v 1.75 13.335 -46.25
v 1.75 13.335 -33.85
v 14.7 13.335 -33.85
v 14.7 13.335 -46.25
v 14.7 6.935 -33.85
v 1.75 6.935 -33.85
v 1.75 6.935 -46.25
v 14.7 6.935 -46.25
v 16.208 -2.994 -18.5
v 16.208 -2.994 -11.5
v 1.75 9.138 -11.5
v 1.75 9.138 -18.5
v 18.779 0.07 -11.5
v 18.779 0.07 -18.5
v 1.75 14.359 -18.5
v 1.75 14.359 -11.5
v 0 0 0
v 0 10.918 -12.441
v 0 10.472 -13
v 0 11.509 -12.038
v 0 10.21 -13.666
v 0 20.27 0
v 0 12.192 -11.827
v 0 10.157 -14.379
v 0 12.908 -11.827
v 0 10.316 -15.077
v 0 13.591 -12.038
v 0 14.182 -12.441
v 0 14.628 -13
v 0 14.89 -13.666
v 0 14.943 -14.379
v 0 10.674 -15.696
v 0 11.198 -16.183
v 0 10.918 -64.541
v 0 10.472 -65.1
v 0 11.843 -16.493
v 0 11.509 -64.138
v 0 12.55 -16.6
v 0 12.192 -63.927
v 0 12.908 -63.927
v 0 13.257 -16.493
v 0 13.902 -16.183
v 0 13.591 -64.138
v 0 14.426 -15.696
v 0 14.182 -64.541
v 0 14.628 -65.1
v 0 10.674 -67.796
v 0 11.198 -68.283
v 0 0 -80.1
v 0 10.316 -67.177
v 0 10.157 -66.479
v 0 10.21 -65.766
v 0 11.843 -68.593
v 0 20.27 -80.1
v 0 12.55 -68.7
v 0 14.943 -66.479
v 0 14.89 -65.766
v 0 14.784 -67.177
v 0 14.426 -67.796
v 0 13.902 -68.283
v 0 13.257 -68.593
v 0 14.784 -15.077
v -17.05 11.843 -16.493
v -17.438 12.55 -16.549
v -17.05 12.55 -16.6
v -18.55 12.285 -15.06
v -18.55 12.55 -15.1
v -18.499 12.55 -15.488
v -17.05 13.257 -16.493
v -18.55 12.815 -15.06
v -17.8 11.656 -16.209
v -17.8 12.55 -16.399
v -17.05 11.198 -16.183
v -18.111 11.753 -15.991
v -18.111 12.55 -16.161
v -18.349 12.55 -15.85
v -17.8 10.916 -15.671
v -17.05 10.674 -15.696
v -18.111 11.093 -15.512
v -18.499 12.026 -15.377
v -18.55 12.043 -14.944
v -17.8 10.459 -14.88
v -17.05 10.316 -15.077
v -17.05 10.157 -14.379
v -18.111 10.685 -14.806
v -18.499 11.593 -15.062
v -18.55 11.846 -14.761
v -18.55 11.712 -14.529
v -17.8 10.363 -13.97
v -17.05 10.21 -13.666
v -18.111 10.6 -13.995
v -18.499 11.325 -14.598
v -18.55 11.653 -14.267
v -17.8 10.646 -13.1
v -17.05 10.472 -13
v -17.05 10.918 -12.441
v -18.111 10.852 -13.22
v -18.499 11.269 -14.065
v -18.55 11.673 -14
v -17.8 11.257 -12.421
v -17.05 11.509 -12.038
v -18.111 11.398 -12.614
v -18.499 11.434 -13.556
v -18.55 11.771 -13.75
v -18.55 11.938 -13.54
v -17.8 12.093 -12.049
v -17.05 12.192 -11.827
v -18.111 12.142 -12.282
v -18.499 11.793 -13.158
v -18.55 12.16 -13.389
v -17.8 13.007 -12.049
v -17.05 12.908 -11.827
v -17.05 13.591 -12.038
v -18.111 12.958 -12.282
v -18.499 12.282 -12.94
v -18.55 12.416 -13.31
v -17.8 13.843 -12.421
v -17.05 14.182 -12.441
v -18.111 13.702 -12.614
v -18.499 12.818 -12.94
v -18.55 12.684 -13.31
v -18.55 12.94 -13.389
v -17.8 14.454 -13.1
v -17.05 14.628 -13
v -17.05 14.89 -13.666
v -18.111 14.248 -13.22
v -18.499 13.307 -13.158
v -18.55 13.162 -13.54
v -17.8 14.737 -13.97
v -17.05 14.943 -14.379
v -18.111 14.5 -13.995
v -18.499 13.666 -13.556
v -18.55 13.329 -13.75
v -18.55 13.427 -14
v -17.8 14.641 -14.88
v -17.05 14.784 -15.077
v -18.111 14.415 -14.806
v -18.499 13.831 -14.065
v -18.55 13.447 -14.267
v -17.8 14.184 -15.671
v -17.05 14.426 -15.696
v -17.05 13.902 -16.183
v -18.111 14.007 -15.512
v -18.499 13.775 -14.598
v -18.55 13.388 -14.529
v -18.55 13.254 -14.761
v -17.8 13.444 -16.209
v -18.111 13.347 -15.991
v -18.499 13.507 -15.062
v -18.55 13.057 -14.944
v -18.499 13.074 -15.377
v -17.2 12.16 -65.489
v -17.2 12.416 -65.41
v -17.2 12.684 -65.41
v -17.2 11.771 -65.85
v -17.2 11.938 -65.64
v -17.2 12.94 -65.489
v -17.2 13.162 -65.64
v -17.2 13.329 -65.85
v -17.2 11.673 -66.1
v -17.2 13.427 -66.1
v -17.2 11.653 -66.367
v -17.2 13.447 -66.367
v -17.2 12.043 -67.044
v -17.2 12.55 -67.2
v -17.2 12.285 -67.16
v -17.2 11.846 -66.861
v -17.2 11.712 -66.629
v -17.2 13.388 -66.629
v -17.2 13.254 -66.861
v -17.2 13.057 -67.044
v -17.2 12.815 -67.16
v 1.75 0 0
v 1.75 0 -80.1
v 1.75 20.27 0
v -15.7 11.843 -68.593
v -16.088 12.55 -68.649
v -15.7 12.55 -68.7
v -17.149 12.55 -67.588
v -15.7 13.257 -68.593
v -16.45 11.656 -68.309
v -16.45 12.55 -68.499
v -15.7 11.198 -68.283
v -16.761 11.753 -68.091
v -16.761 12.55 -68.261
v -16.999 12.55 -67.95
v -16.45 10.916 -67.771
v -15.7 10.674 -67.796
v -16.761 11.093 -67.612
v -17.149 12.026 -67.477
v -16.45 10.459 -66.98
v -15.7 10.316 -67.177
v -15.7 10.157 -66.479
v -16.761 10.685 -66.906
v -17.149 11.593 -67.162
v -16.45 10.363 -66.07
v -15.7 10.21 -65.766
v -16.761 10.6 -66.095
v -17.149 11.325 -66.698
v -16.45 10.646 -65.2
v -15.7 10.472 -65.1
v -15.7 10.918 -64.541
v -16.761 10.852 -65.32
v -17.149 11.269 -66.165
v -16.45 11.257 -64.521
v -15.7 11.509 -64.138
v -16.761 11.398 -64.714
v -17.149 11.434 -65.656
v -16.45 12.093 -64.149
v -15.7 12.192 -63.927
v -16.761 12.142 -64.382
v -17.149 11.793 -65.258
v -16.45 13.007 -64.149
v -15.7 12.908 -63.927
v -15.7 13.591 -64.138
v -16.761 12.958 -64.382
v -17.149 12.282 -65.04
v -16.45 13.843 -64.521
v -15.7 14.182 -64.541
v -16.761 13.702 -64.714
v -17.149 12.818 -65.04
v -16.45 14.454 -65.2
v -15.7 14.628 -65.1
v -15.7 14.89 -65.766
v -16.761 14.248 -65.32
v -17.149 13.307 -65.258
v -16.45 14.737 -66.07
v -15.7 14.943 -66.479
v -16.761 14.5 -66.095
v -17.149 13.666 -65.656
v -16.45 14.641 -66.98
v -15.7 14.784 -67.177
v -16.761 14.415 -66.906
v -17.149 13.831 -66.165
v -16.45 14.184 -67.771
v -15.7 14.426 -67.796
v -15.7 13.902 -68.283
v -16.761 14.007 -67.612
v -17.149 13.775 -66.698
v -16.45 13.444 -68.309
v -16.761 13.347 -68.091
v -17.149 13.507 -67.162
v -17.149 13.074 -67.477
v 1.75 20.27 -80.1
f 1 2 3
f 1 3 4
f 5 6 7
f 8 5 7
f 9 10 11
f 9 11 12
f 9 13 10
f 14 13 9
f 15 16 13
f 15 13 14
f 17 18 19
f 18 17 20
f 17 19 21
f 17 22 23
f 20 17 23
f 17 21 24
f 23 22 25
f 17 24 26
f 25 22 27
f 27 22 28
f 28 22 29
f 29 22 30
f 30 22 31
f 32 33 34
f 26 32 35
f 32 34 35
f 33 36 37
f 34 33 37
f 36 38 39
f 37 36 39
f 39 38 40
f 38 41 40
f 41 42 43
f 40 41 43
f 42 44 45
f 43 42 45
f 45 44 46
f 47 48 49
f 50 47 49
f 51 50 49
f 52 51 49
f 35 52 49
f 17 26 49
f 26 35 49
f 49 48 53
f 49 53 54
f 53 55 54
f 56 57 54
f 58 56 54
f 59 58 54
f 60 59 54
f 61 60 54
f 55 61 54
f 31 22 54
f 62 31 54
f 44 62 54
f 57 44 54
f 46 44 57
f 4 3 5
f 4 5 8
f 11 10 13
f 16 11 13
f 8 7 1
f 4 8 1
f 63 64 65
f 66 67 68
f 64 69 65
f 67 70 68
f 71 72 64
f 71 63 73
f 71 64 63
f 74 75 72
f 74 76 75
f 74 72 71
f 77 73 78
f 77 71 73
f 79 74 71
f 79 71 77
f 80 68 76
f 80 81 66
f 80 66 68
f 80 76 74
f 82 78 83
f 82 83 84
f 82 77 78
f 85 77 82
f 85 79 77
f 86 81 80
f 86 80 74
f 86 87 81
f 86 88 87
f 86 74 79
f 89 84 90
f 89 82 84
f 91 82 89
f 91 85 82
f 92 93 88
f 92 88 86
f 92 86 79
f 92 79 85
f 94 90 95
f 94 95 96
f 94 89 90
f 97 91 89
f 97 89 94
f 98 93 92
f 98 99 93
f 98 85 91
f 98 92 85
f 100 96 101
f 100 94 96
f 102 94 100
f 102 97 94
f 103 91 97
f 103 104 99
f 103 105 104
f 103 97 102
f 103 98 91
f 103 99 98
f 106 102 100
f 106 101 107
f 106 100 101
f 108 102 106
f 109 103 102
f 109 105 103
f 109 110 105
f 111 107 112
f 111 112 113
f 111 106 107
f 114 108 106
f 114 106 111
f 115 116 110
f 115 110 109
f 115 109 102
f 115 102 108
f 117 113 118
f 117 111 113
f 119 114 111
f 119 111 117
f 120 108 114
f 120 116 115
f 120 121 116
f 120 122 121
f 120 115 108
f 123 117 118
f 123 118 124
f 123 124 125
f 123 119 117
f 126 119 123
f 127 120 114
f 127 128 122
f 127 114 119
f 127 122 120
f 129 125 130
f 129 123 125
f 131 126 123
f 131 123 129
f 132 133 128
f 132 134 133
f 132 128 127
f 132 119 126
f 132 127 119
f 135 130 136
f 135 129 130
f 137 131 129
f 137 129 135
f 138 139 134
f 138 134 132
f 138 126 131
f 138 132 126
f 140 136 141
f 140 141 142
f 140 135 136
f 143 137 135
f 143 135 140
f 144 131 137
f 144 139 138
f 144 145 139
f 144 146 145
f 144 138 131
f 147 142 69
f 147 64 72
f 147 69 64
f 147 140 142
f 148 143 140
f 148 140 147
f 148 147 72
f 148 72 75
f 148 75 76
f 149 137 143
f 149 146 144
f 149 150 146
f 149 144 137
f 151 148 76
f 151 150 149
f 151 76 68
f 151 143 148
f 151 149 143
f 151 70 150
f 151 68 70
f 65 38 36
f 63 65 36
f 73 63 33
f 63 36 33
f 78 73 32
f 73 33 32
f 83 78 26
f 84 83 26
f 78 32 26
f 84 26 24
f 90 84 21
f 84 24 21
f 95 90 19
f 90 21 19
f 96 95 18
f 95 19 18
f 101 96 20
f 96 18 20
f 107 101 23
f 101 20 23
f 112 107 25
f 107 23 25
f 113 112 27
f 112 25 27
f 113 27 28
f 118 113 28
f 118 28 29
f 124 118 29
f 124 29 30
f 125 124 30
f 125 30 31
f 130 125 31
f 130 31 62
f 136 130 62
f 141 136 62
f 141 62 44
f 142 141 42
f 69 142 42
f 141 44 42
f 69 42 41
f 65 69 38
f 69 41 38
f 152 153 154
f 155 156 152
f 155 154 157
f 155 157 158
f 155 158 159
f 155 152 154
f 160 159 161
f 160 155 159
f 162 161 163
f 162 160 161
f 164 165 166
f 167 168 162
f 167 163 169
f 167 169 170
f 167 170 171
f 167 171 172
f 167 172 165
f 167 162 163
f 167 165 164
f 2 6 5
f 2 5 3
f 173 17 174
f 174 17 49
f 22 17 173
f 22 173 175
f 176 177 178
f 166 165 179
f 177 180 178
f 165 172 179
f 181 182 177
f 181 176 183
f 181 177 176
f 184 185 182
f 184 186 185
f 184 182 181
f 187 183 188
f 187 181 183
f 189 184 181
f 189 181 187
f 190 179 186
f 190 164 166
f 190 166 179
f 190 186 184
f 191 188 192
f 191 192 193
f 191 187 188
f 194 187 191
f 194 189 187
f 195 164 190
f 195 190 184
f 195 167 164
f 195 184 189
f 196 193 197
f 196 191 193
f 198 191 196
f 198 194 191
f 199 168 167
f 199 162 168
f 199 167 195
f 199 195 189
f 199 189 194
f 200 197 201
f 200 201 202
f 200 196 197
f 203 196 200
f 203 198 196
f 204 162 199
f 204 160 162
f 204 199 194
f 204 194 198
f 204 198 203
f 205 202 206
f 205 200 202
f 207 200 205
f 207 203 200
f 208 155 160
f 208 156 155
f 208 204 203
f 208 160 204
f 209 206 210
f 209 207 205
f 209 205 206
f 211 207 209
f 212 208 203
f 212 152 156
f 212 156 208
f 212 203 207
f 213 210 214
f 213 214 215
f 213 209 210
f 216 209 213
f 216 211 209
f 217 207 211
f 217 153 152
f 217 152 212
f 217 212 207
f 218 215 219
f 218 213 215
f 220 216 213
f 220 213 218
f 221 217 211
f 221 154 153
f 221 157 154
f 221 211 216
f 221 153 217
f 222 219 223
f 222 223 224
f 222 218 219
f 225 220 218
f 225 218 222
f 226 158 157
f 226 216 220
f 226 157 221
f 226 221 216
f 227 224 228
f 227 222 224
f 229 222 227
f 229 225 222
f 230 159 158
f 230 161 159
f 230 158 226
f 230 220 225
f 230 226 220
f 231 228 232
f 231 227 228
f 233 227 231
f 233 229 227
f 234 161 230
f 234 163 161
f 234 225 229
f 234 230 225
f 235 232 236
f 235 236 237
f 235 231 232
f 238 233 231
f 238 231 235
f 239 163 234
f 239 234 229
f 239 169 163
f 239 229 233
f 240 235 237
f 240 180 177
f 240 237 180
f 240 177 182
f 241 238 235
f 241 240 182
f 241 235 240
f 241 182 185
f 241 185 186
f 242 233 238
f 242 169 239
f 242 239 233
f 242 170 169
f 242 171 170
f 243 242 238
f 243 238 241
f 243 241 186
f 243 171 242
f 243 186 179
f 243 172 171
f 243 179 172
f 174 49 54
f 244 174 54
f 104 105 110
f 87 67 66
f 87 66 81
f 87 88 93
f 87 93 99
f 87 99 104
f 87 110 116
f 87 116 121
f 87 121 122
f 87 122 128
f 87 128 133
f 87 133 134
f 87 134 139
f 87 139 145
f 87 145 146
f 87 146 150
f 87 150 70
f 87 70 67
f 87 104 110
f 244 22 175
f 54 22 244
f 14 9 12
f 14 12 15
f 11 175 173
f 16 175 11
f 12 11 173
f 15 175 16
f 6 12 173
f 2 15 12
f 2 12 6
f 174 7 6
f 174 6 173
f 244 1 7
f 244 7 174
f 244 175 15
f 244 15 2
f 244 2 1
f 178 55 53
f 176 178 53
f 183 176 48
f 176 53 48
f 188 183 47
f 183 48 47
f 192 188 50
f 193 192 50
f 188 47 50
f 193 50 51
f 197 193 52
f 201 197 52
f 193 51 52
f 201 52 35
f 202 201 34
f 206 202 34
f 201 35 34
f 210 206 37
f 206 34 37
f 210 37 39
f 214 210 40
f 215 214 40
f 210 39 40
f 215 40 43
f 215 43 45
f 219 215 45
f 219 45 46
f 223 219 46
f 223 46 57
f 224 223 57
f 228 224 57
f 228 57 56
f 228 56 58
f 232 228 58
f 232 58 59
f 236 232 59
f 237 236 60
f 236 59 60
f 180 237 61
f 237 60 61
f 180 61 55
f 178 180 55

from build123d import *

# Parameters (mm, degrees)
SKETCH1_W                       = 80.1
SKETCH1_H                       = 20.27
SKETCH1_W_2                     = 12.4
SKETCH1_H_2                     = 6.4
BOSS_EXTRUDE1_DEPTH             = 1.75
SKETCH1_2_W                     = 12.4
SKETCH1_2_H                     = 6.4
BOSS_EXTRUDE2_DEPTH             = 14.7
BOSS_EXTRUDE3_REACH             = 85.961
SKETCH2_W                       = 7
SKETCH2_H                       = 4
BOSS_EXTRUDE3_DIRECTION_2_DEPTH = 13
SKETCH3_R                       = 2.4
BOSS_EXTRUDE4_DEPTH             = 18.55
SKETCH3_3_R                     = 2.4
BOSS_EXTRUDE5_DEPTH             = 17.2
FILLET1_R                       = 1.5


with BuildPart() as part:
    # Sketch1 → Boss-Extrude1 (new body)
    with BuildSketch(Plane(origin=(0, 0, 0), x_dir=(0, 0, -1), z_dir=(1, 0, 0))):
        with Locations((40.05, 10.135)):
            Rectangle(SKETCH1_W, SKETCH1_H)
        with Locations((40.05, 10.135)):
            Rectangle(SKETCH1_W_2, SKETCH1_H_2, mode=Mode.SUBTRACT)
    extrude(amount=BOSS_EXTRUDE1_DEPTH)

    # Sketch1<2> → Boss-Extrude2 (add)
    with BuildSketch(Plane(origin=(0, 0, 0), x_dir=(0, 0, -1), z_dir=(1, 0, 0))):
        with Locations((40.05, 10.135)):
            Rectangle(SKETCH1_2_W, SKETCH1_2_H)
    extrude(amount=BOSS_EXTRUDE2_DEPTH)

    # Boss-Extrude3: up to this plane
    boss_extrude3_end = Plane(origin=(1.75, 0, 0), z_dir=(1, 0, 0))
    # Sketch2 → Boss-Extrude3 (add, up to the surface)
    with BuildSketch(Plane(origin=(1.026942155, -0.861706784, 0), x_dir=(0, 0, -1), z_dir=(0.7660444431189771, -0.6427876096865406, 0)), mode=Mode.PRIVATE) as boss_extrude3_sk1:
        with Locations((15, 10.124878317)):
            Rectangle(SKETCH2_W, SKETCH2_H)
    boss_extrude3_tool1 = split(extrude(boss_extrude3_sk1.sketch, amount=-BOSS_EXTRUDE3_REACH, mode=Mode.PRIVATE), bisect_by=boss_extrude3_end, keep=Keep.BOTH, mode=Mode.PRIVATE)
    add(boss_extrude3_tool1.solids().sort_by_distance((7.535088, 6.8944, -15))[0])

    # Sketch2 → Boss-Extrude3 direction 2 (add)
    with BuildSketch(Plane(origin=(1.026942155, -0.861706784, 0), x_dir=(0, 0, -1), z_dir=(0.7660444431189771, -0.6427876096865406, 0))):
        with Locations((15, 10.124878317)):
            Rectangle(SKETCH2_W, SKETCH2_H)
    extrude(amount=BOSS_EXTRUDE3_DIRECTION_2_DEPTH)

    # Sketch3 → Boss-Extrude4 (add)
    with BuildSketch(Plane.ZY):
        with Locations(Location((-14.2, 12.55, 0), (0, 0, 180))):
            Circle(SKETCH3_R)
    extrude(amount=BOSS_EXTRUDE4_DEPTH)

    # Sketch3<3> → Boss-Extrude5 (add)
    with BuildSketch(Plane.ZY):
        with Locations(Location((-66.3, 12.55, 0), (0, 0, 180))):
            Circle(SKETCH3_3_R)
    extrude(amount=BOSS_EXTRUDE5_DEPTH)

    # Fillet1
    fillet1_edges = [part.edges().sort_by_distance(p)[0] for p in [
        (-18.55, 12.55, -11.8),
        (-17.2, 12.55, -63.9),
    ]]
    fillet(fillet1_edges, radius=FILLET1_R)


solid = part.part
